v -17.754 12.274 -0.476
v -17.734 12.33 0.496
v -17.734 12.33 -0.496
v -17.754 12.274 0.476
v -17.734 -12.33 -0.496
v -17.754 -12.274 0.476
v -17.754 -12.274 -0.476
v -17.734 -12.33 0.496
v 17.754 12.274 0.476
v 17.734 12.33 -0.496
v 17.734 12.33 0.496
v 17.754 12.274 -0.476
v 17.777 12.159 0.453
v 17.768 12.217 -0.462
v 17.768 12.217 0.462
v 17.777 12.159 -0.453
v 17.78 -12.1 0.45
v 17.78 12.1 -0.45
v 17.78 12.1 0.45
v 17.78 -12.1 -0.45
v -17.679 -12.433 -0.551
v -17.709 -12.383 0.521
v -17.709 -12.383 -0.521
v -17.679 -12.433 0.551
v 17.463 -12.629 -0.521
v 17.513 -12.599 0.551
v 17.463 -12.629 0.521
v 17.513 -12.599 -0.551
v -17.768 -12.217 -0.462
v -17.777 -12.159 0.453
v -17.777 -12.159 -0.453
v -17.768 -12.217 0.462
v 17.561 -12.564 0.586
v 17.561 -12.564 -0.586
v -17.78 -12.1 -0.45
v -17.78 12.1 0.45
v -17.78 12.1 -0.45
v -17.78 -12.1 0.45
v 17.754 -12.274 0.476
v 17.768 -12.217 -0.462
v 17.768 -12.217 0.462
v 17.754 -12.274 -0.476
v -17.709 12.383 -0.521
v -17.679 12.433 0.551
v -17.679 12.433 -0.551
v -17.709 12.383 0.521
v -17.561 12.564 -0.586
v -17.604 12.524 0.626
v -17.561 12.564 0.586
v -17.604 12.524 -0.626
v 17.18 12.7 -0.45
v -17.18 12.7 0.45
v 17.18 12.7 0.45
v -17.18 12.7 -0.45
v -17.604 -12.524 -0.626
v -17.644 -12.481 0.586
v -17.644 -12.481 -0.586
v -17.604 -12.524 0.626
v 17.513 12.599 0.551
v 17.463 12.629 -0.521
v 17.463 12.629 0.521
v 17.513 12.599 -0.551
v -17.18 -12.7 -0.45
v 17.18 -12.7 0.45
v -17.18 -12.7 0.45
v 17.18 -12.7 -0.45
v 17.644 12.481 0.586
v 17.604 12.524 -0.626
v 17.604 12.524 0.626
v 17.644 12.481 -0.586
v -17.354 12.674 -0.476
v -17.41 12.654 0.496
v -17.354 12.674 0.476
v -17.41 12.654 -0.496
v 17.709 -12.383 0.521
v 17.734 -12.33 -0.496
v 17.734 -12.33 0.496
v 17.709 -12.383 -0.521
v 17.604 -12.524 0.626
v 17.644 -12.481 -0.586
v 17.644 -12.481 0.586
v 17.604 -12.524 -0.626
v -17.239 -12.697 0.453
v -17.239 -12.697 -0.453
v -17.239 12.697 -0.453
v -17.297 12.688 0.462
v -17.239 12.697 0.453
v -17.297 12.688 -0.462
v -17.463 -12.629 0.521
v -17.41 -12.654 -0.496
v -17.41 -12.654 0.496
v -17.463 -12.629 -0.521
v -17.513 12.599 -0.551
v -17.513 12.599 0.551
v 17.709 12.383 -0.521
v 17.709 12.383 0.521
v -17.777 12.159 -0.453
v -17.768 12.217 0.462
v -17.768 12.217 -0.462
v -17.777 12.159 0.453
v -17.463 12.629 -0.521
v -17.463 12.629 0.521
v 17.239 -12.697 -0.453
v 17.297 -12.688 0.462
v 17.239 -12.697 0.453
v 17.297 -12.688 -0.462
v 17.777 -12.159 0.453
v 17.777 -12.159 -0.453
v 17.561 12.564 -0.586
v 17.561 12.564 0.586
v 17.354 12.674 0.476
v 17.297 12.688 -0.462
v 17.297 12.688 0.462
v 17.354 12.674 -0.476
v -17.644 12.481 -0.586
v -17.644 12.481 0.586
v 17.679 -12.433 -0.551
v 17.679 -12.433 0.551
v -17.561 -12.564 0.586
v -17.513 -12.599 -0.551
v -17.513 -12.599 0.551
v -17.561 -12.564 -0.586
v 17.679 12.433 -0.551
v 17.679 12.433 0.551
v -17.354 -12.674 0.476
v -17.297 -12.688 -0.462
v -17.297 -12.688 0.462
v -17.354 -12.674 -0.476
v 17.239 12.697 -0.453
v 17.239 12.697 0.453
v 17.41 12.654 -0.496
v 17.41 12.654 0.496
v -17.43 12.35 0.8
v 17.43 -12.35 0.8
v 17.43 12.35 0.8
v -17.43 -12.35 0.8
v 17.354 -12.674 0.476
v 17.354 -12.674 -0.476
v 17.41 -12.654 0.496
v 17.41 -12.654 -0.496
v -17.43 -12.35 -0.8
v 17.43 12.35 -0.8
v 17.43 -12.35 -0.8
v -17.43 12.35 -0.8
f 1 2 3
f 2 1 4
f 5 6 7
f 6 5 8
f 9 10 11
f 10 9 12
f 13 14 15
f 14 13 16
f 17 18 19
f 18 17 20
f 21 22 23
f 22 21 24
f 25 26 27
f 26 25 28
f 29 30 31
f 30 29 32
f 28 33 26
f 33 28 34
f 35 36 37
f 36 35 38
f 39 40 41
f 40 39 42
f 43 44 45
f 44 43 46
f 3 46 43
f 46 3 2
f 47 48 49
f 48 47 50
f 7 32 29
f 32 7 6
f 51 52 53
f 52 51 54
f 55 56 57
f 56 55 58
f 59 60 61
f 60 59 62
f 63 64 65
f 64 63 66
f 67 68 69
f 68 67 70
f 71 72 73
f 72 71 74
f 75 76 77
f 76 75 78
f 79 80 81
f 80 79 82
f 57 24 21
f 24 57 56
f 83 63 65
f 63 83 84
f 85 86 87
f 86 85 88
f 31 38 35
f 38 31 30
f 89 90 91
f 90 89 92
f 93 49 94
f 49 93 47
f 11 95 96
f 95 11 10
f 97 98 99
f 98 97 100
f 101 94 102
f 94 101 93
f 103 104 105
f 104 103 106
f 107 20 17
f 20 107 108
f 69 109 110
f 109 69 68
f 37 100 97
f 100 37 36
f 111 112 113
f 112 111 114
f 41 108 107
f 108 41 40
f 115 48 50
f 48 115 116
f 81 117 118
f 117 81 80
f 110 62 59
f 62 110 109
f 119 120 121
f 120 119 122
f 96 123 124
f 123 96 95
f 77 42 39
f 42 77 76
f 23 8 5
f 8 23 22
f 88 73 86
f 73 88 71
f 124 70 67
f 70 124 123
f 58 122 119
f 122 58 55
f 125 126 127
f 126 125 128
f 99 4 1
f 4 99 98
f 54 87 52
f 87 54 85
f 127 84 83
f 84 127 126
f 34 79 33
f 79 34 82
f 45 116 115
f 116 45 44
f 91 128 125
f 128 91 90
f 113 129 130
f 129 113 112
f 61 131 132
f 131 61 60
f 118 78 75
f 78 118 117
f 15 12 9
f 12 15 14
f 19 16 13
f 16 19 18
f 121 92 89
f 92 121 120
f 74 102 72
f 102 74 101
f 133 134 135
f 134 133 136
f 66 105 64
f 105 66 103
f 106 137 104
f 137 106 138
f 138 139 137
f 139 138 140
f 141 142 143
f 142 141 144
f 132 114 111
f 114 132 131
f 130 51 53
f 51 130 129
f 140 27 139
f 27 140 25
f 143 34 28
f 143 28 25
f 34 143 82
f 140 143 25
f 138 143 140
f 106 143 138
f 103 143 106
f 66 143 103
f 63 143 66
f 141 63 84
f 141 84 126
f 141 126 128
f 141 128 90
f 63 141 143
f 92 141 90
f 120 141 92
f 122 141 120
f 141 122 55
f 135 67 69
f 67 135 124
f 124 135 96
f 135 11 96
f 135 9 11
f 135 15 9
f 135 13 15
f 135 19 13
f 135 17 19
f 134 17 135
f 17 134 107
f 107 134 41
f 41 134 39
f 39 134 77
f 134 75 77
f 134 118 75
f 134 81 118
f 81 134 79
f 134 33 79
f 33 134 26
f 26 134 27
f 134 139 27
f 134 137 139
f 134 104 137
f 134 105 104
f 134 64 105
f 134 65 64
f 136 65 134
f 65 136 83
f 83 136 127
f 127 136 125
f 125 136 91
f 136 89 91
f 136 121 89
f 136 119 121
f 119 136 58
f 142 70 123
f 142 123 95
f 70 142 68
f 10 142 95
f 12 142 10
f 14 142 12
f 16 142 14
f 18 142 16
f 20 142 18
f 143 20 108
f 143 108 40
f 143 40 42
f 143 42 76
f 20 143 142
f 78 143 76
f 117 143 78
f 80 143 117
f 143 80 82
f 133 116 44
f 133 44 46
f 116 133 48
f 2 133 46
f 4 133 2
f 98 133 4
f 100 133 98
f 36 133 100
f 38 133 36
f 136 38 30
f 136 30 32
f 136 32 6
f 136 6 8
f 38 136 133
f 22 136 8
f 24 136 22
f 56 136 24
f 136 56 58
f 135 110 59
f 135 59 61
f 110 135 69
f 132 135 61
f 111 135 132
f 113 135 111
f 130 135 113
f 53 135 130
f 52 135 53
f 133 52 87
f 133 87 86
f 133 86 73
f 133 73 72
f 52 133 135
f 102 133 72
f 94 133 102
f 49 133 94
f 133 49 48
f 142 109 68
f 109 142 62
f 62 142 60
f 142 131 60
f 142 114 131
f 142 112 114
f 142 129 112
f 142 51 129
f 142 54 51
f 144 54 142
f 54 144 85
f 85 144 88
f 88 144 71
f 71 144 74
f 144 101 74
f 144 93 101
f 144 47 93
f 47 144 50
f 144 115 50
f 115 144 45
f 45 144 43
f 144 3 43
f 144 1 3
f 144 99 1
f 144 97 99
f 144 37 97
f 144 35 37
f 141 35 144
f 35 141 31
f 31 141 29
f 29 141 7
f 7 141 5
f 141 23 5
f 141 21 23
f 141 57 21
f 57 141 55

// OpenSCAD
// Printed Circuit Board (PCB) - 35.56mm x 25.4mm x 1.6mm
// One connected solid, with subtle PCB-like edge rounding and corner chamfers.

$fn = 64;

// Parameters
pcb_L = 35.56; // length (X)
pcb_W = 25.4;  // width  (Y)
pcb_T = 1.6;   // thickness (Z)

// Edge styling (kept small relative to thickness)
edge_r = min(0.6, pcb_T/2 - 0.05);   // rounded vertical edges
chamfer = 0.35;                      // small corner chamfer on top/bottom

module pcb_solid(L, W, T, r, c) {
    // Base rounded-rectangle prism via hull of corner cylinders
    module rounded_prism() {
        hull() {
            for (sx = [-1, 1], sy = [-1, 1])
                translate([sx*(L/2 - r), sy*(W/2 - r), 0])
                    cylinder(r=r, h=T, center=true);
        }
    }

    // Add slight top/bottom corner chamfer by intersecting with a tapered hull
    // (keeps a single connected solid; no floating parts)
    intersection() {
        rounded_prism();

        // Tapered "envelope" that trims corners slightly near top/bottom
        hull() {
            // Middle section (full size)
            translate([0, 0, 0])
                cube([L, W, T - 2*c], center=true);

            // Top reduced
            translate([0, 0, (T/2 - c)])
                cube([L - 2*c, W - 2*c, 2*c], center=true);

            // Bottom reduced
            translate([0, 0, -(T/2 - c)])
                cube([L - 2*c, W - 2*c, 2*c], center=true);
        }
    }
}

// Final Output
color([0.0, 0.4, 0.2])
pcb_solid(pcb_L, pcb_W, pcb_T, edge_r, chamfer);
